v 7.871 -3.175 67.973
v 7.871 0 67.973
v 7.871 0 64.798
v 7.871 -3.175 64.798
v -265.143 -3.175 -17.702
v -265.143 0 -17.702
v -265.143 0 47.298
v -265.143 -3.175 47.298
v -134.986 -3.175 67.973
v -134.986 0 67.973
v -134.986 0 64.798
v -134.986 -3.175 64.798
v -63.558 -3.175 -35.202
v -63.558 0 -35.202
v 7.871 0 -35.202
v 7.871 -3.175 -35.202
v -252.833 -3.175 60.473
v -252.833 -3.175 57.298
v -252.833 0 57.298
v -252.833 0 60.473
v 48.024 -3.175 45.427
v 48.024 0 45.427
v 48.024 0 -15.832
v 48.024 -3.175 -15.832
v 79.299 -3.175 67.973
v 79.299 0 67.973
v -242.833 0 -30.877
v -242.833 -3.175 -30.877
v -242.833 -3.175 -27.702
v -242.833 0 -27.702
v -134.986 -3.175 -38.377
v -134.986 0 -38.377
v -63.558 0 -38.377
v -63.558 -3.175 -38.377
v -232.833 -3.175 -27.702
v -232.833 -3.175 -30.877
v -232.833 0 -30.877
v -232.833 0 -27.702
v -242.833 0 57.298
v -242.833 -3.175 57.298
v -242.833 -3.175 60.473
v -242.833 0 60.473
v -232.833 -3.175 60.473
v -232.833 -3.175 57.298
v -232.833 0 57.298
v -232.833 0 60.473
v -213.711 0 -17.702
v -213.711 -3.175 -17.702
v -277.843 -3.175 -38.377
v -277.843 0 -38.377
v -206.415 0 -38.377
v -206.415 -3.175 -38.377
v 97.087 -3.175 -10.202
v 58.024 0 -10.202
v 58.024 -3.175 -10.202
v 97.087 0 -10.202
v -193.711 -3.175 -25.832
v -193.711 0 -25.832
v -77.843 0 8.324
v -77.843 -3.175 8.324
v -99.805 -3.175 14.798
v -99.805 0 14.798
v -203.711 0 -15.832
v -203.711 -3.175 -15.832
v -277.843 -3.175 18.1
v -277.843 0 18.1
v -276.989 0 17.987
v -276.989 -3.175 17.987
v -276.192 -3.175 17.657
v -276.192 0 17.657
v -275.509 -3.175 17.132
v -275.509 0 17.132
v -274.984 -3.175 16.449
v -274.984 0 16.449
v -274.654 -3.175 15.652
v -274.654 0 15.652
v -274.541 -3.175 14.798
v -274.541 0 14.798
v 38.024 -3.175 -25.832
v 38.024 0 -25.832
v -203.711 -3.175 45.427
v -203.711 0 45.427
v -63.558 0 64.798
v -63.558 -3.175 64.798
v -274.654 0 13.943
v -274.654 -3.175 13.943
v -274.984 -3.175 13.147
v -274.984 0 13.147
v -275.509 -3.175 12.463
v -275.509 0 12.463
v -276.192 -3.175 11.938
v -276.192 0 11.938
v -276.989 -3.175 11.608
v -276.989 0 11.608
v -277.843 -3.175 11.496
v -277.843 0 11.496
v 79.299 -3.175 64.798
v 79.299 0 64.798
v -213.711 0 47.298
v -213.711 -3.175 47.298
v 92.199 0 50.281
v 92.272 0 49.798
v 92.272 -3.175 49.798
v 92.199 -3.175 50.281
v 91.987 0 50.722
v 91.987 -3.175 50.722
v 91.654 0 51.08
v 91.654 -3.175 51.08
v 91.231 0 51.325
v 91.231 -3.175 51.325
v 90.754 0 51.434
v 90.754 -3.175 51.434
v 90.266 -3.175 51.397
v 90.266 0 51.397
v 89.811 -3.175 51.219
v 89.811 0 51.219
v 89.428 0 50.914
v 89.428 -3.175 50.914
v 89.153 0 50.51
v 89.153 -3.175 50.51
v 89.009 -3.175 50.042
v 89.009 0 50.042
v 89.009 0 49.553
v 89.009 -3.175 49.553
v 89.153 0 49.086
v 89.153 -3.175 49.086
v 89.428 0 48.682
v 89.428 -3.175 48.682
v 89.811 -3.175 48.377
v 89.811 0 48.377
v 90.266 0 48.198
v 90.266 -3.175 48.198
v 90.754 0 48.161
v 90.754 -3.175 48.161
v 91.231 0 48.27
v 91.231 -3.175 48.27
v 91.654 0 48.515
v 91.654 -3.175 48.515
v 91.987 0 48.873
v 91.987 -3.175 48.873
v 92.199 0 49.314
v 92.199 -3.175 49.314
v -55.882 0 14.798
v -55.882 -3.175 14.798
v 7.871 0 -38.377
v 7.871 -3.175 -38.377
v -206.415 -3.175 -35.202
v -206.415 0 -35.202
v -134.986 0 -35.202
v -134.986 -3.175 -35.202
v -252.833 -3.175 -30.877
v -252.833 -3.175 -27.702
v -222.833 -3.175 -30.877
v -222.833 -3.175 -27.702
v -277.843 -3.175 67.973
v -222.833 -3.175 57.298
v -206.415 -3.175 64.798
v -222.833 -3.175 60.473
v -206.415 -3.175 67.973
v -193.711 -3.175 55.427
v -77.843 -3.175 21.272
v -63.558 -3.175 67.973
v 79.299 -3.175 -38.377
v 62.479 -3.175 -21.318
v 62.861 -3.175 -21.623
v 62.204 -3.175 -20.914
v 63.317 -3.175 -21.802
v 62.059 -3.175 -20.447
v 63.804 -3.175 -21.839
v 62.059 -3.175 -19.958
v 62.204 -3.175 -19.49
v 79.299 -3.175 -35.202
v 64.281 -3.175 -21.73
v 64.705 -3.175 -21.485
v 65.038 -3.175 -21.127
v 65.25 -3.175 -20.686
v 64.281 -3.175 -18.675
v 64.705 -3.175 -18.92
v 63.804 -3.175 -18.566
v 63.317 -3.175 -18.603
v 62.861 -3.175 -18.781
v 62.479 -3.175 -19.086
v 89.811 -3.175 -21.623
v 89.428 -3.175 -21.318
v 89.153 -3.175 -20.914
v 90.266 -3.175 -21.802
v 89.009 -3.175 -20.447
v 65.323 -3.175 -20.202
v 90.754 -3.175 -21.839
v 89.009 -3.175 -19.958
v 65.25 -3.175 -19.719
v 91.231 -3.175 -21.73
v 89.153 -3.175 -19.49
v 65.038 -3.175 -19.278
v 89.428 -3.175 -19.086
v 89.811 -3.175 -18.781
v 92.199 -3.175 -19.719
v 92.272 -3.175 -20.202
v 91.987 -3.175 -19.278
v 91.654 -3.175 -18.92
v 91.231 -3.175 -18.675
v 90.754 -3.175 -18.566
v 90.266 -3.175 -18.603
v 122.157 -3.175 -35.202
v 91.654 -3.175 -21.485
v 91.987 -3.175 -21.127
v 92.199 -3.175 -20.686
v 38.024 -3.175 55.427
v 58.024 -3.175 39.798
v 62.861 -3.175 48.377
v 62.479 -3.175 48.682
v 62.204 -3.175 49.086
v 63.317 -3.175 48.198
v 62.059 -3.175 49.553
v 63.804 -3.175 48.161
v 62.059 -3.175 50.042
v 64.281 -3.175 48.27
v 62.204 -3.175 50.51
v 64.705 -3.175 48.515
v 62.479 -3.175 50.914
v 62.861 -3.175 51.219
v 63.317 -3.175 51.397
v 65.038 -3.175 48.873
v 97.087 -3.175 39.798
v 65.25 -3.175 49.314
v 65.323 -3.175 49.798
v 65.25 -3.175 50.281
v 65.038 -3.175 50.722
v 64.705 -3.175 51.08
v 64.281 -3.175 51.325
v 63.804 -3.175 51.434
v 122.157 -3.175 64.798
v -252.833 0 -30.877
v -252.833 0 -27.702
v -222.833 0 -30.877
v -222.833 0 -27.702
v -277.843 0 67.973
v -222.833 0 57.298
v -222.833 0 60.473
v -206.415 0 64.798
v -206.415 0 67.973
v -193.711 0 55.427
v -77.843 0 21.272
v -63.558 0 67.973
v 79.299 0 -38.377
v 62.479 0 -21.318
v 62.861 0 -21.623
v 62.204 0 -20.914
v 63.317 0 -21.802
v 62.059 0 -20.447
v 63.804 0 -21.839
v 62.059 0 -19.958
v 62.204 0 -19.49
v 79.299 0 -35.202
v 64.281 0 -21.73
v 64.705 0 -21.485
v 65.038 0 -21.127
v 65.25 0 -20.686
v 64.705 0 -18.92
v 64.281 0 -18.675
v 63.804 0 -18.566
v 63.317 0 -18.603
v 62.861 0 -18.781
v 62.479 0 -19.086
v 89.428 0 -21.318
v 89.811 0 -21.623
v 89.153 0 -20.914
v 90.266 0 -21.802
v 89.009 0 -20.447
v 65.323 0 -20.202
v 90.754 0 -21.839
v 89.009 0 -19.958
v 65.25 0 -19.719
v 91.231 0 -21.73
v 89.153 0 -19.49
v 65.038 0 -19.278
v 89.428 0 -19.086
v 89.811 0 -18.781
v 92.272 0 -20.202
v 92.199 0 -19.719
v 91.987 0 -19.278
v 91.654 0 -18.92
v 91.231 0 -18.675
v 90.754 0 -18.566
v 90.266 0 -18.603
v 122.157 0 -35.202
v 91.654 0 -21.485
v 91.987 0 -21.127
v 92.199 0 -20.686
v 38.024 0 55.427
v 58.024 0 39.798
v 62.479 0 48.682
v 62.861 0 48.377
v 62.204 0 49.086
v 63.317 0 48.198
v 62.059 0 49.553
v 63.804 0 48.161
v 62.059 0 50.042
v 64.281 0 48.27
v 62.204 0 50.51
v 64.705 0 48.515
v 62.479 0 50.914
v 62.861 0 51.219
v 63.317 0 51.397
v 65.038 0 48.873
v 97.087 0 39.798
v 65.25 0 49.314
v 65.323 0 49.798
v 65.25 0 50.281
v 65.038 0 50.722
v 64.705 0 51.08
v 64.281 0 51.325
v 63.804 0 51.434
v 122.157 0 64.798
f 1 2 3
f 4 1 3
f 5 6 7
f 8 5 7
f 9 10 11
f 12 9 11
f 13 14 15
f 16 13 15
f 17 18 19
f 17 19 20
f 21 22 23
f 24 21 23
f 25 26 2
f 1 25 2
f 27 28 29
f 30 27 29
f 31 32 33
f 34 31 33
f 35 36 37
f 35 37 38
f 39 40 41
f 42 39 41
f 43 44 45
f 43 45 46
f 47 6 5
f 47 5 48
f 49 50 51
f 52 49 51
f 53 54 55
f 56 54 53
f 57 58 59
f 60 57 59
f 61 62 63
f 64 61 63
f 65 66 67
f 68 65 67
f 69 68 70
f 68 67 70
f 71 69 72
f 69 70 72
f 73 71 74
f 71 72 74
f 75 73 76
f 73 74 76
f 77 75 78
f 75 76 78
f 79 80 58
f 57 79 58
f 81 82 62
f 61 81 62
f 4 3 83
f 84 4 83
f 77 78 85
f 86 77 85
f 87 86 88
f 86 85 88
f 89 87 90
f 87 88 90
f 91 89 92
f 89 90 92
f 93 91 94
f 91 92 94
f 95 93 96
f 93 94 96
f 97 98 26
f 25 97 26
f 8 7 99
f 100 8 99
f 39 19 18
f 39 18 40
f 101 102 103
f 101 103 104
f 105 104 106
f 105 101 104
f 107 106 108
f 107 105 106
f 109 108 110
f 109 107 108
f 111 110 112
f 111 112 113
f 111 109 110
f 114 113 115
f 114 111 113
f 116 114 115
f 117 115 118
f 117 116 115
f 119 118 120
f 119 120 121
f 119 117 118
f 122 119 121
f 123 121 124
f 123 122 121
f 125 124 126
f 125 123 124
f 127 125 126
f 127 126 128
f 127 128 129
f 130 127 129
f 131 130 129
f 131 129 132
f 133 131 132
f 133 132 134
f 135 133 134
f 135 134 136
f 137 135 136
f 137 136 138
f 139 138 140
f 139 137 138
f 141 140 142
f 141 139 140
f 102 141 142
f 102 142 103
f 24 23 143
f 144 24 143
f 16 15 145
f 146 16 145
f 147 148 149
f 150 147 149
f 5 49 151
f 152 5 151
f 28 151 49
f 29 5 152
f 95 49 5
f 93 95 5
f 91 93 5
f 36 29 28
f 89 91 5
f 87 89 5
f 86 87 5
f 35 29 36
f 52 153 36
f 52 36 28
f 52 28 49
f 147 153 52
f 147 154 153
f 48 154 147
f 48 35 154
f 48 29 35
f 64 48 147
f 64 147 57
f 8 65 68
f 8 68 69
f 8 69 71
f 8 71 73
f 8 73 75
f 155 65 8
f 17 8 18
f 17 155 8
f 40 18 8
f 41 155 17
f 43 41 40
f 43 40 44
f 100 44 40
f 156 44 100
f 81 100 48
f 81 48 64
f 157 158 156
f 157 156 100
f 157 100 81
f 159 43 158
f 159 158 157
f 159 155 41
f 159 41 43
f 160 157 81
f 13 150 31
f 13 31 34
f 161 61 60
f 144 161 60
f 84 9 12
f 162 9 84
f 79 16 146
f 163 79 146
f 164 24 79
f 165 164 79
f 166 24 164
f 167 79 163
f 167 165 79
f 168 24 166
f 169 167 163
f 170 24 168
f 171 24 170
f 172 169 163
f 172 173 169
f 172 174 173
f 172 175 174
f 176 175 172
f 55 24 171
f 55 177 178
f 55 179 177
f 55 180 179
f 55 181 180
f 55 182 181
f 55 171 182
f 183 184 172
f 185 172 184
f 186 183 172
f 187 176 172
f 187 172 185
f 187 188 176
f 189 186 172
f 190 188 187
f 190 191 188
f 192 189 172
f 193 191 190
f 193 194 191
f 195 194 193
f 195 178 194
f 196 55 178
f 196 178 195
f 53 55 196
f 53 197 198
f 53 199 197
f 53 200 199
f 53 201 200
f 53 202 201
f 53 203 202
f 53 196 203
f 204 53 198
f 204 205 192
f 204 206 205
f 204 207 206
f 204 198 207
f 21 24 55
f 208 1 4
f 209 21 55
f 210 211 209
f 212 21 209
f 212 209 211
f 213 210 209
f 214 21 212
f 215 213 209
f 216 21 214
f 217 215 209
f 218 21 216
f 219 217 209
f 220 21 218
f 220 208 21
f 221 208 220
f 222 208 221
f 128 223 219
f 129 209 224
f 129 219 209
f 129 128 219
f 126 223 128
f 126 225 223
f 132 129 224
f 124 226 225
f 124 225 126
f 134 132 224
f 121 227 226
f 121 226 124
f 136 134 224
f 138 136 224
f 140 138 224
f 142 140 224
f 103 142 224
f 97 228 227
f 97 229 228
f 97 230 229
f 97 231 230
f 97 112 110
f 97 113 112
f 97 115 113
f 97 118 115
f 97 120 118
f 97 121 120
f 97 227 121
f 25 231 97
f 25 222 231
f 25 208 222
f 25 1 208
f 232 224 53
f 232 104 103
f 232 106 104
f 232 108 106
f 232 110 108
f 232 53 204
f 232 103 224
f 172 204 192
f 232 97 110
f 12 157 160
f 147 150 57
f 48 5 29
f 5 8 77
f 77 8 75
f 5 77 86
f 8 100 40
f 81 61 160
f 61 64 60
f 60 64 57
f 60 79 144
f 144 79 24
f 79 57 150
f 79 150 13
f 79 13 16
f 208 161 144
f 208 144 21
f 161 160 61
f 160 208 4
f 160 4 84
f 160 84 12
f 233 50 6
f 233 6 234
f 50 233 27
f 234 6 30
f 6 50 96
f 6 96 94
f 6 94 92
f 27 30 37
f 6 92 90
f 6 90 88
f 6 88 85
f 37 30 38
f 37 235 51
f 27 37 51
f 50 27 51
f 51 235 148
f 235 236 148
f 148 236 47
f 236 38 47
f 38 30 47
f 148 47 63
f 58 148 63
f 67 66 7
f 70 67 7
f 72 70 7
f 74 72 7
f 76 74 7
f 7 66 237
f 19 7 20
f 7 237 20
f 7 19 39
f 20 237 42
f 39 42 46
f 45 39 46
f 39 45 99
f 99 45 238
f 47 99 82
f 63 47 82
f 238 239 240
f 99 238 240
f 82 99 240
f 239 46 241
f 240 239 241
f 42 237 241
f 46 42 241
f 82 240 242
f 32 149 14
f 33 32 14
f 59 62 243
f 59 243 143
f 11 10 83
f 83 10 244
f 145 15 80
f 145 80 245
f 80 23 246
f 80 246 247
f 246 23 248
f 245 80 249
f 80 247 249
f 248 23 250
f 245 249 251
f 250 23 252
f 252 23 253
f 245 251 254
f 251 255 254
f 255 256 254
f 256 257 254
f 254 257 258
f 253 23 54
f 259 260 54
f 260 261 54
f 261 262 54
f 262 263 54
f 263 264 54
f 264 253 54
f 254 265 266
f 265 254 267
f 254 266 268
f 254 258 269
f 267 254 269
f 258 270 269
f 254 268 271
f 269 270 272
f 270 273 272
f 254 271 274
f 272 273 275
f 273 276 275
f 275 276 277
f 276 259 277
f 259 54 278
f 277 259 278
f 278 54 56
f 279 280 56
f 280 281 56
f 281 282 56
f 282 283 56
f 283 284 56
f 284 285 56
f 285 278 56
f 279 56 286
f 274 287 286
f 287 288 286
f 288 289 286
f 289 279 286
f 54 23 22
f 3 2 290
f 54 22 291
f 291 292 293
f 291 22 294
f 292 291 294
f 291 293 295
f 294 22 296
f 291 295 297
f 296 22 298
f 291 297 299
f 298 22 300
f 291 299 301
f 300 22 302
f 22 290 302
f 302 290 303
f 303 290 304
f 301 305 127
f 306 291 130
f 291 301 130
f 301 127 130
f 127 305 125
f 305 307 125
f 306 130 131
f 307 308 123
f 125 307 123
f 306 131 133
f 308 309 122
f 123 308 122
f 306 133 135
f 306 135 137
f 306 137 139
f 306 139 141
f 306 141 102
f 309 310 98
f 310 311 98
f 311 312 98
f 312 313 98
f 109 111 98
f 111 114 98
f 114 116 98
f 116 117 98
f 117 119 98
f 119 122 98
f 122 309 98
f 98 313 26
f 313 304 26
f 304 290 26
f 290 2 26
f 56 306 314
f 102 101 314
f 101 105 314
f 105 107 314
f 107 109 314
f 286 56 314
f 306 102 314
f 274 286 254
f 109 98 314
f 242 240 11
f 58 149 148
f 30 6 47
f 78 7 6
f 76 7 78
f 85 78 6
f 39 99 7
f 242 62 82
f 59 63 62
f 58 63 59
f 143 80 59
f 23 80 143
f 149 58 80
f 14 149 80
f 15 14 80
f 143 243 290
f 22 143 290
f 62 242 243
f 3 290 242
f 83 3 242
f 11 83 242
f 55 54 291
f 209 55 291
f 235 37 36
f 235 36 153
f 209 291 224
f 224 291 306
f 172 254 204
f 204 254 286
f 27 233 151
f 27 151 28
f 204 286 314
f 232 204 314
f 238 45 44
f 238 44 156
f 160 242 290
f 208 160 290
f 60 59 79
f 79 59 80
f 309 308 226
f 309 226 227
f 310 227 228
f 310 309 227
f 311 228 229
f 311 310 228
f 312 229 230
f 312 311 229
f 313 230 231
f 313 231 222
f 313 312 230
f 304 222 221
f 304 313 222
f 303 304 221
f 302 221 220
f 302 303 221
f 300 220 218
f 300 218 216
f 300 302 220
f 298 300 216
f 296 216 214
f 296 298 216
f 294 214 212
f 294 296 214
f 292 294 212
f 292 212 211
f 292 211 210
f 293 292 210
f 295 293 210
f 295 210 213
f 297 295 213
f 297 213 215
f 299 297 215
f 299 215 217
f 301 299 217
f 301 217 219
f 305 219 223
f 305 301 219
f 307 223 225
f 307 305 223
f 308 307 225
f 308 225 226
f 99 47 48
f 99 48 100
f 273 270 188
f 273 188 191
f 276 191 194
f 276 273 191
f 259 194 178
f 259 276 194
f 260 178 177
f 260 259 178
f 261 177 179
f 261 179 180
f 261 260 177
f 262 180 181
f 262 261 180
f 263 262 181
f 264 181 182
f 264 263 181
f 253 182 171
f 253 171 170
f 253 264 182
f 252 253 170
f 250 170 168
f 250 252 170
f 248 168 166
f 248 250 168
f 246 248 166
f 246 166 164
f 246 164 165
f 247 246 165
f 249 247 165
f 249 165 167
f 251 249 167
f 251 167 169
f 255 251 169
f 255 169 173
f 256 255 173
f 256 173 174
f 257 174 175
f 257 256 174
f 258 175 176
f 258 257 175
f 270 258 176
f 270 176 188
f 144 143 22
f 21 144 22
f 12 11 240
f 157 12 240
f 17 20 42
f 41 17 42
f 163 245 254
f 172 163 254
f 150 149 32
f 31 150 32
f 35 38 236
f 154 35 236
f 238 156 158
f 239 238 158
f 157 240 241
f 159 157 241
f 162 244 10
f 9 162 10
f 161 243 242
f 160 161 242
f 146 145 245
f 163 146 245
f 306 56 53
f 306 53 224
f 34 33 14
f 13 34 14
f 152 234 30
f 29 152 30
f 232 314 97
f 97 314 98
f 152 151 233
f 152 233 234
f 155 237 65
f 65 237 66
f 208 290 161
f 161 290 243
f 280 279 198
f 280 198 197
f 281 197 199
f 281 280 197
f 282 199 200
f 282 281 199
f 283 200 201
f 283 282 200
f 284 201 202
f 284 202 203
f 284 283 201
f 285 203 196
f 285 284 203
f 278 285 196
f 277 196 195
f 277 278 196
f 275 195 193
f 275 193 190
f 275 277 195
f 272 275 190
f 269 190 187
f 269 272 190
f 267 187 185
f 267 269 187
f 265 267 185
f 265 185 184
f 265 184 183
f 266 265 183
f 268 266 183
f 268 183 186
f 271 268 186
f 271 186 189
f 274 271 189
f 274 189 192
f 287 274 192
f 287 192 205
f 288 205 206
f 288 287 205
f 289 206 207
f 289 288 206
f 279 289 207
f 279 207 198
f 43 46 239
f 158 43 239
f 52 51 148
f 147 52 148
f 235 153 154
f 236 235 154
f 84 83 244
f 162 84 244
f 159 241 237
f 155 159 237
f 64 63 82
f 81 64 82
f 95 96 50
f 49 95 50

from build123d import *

# Parameters (mm, degrees)
F0_W     = 10
F0_H     = 3.175
F0_W_2   = 51.432349664
F0_H_2   = 65
F0_R     = 1.64084
F0_W_3   = 39.0626990616
F0_H_3   = 50
F1_DEPTH = 3.175


# Not quite as in the source:
# - a feature names something its author has since deleted; it is built from what else it names


with BuildPart() as f1:
    # F0 (on Front) → F1 (new body)
    with BuildSketch(Plane.XZ):
        with BuildLine():
            Line((79.2994276966, -35.2024036679), (122.1565705538, -35.2024036679))
            Line((122.1565705538, -35.2024036679), (122.1565705538, 64.7975963321))
            Line((122.1565705538, 64.7975963321), (79.2994276966, 64.7975963321))
            Line((79.2994276966, 64.7975963321), (79.2994276966, 67.9725963321))
            Line((79.2994276966, 67.9725963321), (7.870856268, 67.9725963321))
            Line((7.870856268, 67.9725963321), (7.870856268, 64.7975963321))
            Line((7.870856268, 64.7975963321), (-63.5577151605, 64.7975963321))
            Line((-63.5577151605, 64.7975963321), (-63.5577151605, 67.9725963321))
            Line((-63.5577151605, 67.9725963321), (-134.9862865891, 67.9725963321))
            Line((-134.9862865891, 67.9725963321), (-134.9862865891, 64.7975963321))
            Line((-134.9862865891, 64.7975963321), (-206.4148580177, 64.7975963321))
            Line((-206.4148580177, 64.7975963321), (-206.4148580177, 67.9725963321))
            Line((-206.4148580177, 67.9725963321), (-277.8434294462, 67.9725963321))
            Line((-277.8434294462, 67.9725963321), (-277.8434294462, 64.7975963321))
            Line((-277.8434294462, 64.7975963321), (-277.8434294462, 18.0995963321))
            ThreePointArc((-277.8434294462, 18.0995963321), (-275.5085628548, 17.1324629236), (-274.5414294462, 14.7975963321))
            ThreePointArc((-274.5414294462, 14.7975963321), (-275.5085628548, 12.4627297406), (-277.8434294462, 11.4955963321))
            Line((-277.8434294462, 11.4955963321), (-277.8434294462, -35.2024036679))
            Line((-277.8434294462, -35.2024036679), (-277.8434294462, -38.3774036679))
            Line((-277.8434294462, -38.3774036679), (-206.4148580177, -38.3774036679))
            Line((-206.4148580177, -38.3774036679), (-206.4148580177, -35.2024036679))
            Line((-206.4148580177, -35.2024036679), (-134.9862865891, -35.2024036679))
            Line((-134.9862865891, -35.2024036679), (-134.9862865891, -38.3774036679))
            Line((-134.9862865891, -38.3774036679), (-63.5577151605, -38.3774036679))
            Line((-63.5577151605, -38.3774036679), (-63.5577151605, -35.2024036679))
            Line((-63.5577151605, -35.2024036679), (7.870856268, -35.2024036679))
            Line((7.870856268, -35.2024036679), (7.870856268, -38.3774036679))
            Line((7.870856268, -38.3774036679), (79.2994276966, -38.3774036679))
            Line((79.2994276966, -38.3774036679), (79.2994276966, -35.2024036679))
        make_face()
        with Locations((-247.8332173824, -29.2899036679)):
            Rectangle(F0_W, F0_H, mode=Mode.SUBTRACT)
        with Locations((-227.8332173824, -29.2899036679)):
            Rectangle(F0_W, F0_H, mode=Mode.SUBTRACT)
        with Locations((-239.4272546143, 14.7975963321)):
            Rectangle(F0_W_2, F0_H_2, mode=Mode.SUBTRACT)
        with Locations((63.6818705538, -20.2024036679)):
            Circle(F0_R, mode=Mode.SUBTRACT)
        with Locations((90.6312705538, -20.2024036679)):
            Circle(F0_R, mode=Mode.SUBTRACT)
        Polygon((48.0242208898, -15.8320336679), (48.0242208898, -25.8320336679), (38.0242208898, -25.8320336679), (-193.7110797823, -25.8320336679), (-203.7110797823, -25.8320336679), (-203.7110797823, -15.8320336679), (-203.7110797823, 45.4272263321), (-203.7110797823, 55.4272263321), (-193.7110797823, 55.4272263321), (38.0242208898, 55.4272263321), (48.0242208898, 55.4272263321), (48.0242208898, 45.4272263321), align=None, mode=Mode.SUBTRACT)
        with Locations((77.5555704206, 14.7975963321)):
            Rectangle(F0_W_3, F0_H_3, mode=Mode.SUBTRACT)
        with Locations((-247.8332173824, 58.8850963321)):
            Rectangle(F0_W, F0_H, mode=Mode.SUBTRACT)
        with Locations((-227.8332173824, 58.8850963321)):
            Rectangle(F0_W, F0_H, mode=Mode.SUBTRACT)
        with Locations((63.6818705538, 49.7975963321)):
            Circle(F0_R, mode=Mode.SUBTRACT)
        with Locations((90.6312705538, 49.7975963321)):
            Circle(F0_R, mode=Mode.SUBTRACT)
        Polygon((-203.7110797823, 45.4272263321), (-99.8051057724, 14.7975963321), (-77.8434294462, 21.2715072545), (-193.7110797823, 55.4272263321), (-203.7110797823, 55.4272263321), align=None)
        Polygon((-203.7110797823, -25.8320336679), (-193.7110797823, -25.8320336679), (-77.8434294462, 8.3236854097), (-99.8051057724, 14.7975963321), (-203.7110797823, -15.8320336679), align=None)
        Polygon((38.0242208898, -25.8320336679), (48.0242208898, -25.8320336679), (48.0242208898, -15.8320336679), (-55.8817531201, 14.7975963321), (-77.8434294462, 8.3236854097), align=None)
        Polygon((-55.8817531201, 14.7975963321), (48.0242208898, 45.4272263321), (48.0242208898, 55.4272263321), (38.0242208898, 55.4272263321), (-77.8434294462, 21.2715072545), align=None)
        Polygon((-99.8051057724, 14.7975963321), (-77.8434294462, 8.3236854097), (-55.8817531201, 14.7975963321), (-77.8434294462, 21.2715072545), align=None)
    extrude(amount=F1_DEPTH)


solid = f1.part
